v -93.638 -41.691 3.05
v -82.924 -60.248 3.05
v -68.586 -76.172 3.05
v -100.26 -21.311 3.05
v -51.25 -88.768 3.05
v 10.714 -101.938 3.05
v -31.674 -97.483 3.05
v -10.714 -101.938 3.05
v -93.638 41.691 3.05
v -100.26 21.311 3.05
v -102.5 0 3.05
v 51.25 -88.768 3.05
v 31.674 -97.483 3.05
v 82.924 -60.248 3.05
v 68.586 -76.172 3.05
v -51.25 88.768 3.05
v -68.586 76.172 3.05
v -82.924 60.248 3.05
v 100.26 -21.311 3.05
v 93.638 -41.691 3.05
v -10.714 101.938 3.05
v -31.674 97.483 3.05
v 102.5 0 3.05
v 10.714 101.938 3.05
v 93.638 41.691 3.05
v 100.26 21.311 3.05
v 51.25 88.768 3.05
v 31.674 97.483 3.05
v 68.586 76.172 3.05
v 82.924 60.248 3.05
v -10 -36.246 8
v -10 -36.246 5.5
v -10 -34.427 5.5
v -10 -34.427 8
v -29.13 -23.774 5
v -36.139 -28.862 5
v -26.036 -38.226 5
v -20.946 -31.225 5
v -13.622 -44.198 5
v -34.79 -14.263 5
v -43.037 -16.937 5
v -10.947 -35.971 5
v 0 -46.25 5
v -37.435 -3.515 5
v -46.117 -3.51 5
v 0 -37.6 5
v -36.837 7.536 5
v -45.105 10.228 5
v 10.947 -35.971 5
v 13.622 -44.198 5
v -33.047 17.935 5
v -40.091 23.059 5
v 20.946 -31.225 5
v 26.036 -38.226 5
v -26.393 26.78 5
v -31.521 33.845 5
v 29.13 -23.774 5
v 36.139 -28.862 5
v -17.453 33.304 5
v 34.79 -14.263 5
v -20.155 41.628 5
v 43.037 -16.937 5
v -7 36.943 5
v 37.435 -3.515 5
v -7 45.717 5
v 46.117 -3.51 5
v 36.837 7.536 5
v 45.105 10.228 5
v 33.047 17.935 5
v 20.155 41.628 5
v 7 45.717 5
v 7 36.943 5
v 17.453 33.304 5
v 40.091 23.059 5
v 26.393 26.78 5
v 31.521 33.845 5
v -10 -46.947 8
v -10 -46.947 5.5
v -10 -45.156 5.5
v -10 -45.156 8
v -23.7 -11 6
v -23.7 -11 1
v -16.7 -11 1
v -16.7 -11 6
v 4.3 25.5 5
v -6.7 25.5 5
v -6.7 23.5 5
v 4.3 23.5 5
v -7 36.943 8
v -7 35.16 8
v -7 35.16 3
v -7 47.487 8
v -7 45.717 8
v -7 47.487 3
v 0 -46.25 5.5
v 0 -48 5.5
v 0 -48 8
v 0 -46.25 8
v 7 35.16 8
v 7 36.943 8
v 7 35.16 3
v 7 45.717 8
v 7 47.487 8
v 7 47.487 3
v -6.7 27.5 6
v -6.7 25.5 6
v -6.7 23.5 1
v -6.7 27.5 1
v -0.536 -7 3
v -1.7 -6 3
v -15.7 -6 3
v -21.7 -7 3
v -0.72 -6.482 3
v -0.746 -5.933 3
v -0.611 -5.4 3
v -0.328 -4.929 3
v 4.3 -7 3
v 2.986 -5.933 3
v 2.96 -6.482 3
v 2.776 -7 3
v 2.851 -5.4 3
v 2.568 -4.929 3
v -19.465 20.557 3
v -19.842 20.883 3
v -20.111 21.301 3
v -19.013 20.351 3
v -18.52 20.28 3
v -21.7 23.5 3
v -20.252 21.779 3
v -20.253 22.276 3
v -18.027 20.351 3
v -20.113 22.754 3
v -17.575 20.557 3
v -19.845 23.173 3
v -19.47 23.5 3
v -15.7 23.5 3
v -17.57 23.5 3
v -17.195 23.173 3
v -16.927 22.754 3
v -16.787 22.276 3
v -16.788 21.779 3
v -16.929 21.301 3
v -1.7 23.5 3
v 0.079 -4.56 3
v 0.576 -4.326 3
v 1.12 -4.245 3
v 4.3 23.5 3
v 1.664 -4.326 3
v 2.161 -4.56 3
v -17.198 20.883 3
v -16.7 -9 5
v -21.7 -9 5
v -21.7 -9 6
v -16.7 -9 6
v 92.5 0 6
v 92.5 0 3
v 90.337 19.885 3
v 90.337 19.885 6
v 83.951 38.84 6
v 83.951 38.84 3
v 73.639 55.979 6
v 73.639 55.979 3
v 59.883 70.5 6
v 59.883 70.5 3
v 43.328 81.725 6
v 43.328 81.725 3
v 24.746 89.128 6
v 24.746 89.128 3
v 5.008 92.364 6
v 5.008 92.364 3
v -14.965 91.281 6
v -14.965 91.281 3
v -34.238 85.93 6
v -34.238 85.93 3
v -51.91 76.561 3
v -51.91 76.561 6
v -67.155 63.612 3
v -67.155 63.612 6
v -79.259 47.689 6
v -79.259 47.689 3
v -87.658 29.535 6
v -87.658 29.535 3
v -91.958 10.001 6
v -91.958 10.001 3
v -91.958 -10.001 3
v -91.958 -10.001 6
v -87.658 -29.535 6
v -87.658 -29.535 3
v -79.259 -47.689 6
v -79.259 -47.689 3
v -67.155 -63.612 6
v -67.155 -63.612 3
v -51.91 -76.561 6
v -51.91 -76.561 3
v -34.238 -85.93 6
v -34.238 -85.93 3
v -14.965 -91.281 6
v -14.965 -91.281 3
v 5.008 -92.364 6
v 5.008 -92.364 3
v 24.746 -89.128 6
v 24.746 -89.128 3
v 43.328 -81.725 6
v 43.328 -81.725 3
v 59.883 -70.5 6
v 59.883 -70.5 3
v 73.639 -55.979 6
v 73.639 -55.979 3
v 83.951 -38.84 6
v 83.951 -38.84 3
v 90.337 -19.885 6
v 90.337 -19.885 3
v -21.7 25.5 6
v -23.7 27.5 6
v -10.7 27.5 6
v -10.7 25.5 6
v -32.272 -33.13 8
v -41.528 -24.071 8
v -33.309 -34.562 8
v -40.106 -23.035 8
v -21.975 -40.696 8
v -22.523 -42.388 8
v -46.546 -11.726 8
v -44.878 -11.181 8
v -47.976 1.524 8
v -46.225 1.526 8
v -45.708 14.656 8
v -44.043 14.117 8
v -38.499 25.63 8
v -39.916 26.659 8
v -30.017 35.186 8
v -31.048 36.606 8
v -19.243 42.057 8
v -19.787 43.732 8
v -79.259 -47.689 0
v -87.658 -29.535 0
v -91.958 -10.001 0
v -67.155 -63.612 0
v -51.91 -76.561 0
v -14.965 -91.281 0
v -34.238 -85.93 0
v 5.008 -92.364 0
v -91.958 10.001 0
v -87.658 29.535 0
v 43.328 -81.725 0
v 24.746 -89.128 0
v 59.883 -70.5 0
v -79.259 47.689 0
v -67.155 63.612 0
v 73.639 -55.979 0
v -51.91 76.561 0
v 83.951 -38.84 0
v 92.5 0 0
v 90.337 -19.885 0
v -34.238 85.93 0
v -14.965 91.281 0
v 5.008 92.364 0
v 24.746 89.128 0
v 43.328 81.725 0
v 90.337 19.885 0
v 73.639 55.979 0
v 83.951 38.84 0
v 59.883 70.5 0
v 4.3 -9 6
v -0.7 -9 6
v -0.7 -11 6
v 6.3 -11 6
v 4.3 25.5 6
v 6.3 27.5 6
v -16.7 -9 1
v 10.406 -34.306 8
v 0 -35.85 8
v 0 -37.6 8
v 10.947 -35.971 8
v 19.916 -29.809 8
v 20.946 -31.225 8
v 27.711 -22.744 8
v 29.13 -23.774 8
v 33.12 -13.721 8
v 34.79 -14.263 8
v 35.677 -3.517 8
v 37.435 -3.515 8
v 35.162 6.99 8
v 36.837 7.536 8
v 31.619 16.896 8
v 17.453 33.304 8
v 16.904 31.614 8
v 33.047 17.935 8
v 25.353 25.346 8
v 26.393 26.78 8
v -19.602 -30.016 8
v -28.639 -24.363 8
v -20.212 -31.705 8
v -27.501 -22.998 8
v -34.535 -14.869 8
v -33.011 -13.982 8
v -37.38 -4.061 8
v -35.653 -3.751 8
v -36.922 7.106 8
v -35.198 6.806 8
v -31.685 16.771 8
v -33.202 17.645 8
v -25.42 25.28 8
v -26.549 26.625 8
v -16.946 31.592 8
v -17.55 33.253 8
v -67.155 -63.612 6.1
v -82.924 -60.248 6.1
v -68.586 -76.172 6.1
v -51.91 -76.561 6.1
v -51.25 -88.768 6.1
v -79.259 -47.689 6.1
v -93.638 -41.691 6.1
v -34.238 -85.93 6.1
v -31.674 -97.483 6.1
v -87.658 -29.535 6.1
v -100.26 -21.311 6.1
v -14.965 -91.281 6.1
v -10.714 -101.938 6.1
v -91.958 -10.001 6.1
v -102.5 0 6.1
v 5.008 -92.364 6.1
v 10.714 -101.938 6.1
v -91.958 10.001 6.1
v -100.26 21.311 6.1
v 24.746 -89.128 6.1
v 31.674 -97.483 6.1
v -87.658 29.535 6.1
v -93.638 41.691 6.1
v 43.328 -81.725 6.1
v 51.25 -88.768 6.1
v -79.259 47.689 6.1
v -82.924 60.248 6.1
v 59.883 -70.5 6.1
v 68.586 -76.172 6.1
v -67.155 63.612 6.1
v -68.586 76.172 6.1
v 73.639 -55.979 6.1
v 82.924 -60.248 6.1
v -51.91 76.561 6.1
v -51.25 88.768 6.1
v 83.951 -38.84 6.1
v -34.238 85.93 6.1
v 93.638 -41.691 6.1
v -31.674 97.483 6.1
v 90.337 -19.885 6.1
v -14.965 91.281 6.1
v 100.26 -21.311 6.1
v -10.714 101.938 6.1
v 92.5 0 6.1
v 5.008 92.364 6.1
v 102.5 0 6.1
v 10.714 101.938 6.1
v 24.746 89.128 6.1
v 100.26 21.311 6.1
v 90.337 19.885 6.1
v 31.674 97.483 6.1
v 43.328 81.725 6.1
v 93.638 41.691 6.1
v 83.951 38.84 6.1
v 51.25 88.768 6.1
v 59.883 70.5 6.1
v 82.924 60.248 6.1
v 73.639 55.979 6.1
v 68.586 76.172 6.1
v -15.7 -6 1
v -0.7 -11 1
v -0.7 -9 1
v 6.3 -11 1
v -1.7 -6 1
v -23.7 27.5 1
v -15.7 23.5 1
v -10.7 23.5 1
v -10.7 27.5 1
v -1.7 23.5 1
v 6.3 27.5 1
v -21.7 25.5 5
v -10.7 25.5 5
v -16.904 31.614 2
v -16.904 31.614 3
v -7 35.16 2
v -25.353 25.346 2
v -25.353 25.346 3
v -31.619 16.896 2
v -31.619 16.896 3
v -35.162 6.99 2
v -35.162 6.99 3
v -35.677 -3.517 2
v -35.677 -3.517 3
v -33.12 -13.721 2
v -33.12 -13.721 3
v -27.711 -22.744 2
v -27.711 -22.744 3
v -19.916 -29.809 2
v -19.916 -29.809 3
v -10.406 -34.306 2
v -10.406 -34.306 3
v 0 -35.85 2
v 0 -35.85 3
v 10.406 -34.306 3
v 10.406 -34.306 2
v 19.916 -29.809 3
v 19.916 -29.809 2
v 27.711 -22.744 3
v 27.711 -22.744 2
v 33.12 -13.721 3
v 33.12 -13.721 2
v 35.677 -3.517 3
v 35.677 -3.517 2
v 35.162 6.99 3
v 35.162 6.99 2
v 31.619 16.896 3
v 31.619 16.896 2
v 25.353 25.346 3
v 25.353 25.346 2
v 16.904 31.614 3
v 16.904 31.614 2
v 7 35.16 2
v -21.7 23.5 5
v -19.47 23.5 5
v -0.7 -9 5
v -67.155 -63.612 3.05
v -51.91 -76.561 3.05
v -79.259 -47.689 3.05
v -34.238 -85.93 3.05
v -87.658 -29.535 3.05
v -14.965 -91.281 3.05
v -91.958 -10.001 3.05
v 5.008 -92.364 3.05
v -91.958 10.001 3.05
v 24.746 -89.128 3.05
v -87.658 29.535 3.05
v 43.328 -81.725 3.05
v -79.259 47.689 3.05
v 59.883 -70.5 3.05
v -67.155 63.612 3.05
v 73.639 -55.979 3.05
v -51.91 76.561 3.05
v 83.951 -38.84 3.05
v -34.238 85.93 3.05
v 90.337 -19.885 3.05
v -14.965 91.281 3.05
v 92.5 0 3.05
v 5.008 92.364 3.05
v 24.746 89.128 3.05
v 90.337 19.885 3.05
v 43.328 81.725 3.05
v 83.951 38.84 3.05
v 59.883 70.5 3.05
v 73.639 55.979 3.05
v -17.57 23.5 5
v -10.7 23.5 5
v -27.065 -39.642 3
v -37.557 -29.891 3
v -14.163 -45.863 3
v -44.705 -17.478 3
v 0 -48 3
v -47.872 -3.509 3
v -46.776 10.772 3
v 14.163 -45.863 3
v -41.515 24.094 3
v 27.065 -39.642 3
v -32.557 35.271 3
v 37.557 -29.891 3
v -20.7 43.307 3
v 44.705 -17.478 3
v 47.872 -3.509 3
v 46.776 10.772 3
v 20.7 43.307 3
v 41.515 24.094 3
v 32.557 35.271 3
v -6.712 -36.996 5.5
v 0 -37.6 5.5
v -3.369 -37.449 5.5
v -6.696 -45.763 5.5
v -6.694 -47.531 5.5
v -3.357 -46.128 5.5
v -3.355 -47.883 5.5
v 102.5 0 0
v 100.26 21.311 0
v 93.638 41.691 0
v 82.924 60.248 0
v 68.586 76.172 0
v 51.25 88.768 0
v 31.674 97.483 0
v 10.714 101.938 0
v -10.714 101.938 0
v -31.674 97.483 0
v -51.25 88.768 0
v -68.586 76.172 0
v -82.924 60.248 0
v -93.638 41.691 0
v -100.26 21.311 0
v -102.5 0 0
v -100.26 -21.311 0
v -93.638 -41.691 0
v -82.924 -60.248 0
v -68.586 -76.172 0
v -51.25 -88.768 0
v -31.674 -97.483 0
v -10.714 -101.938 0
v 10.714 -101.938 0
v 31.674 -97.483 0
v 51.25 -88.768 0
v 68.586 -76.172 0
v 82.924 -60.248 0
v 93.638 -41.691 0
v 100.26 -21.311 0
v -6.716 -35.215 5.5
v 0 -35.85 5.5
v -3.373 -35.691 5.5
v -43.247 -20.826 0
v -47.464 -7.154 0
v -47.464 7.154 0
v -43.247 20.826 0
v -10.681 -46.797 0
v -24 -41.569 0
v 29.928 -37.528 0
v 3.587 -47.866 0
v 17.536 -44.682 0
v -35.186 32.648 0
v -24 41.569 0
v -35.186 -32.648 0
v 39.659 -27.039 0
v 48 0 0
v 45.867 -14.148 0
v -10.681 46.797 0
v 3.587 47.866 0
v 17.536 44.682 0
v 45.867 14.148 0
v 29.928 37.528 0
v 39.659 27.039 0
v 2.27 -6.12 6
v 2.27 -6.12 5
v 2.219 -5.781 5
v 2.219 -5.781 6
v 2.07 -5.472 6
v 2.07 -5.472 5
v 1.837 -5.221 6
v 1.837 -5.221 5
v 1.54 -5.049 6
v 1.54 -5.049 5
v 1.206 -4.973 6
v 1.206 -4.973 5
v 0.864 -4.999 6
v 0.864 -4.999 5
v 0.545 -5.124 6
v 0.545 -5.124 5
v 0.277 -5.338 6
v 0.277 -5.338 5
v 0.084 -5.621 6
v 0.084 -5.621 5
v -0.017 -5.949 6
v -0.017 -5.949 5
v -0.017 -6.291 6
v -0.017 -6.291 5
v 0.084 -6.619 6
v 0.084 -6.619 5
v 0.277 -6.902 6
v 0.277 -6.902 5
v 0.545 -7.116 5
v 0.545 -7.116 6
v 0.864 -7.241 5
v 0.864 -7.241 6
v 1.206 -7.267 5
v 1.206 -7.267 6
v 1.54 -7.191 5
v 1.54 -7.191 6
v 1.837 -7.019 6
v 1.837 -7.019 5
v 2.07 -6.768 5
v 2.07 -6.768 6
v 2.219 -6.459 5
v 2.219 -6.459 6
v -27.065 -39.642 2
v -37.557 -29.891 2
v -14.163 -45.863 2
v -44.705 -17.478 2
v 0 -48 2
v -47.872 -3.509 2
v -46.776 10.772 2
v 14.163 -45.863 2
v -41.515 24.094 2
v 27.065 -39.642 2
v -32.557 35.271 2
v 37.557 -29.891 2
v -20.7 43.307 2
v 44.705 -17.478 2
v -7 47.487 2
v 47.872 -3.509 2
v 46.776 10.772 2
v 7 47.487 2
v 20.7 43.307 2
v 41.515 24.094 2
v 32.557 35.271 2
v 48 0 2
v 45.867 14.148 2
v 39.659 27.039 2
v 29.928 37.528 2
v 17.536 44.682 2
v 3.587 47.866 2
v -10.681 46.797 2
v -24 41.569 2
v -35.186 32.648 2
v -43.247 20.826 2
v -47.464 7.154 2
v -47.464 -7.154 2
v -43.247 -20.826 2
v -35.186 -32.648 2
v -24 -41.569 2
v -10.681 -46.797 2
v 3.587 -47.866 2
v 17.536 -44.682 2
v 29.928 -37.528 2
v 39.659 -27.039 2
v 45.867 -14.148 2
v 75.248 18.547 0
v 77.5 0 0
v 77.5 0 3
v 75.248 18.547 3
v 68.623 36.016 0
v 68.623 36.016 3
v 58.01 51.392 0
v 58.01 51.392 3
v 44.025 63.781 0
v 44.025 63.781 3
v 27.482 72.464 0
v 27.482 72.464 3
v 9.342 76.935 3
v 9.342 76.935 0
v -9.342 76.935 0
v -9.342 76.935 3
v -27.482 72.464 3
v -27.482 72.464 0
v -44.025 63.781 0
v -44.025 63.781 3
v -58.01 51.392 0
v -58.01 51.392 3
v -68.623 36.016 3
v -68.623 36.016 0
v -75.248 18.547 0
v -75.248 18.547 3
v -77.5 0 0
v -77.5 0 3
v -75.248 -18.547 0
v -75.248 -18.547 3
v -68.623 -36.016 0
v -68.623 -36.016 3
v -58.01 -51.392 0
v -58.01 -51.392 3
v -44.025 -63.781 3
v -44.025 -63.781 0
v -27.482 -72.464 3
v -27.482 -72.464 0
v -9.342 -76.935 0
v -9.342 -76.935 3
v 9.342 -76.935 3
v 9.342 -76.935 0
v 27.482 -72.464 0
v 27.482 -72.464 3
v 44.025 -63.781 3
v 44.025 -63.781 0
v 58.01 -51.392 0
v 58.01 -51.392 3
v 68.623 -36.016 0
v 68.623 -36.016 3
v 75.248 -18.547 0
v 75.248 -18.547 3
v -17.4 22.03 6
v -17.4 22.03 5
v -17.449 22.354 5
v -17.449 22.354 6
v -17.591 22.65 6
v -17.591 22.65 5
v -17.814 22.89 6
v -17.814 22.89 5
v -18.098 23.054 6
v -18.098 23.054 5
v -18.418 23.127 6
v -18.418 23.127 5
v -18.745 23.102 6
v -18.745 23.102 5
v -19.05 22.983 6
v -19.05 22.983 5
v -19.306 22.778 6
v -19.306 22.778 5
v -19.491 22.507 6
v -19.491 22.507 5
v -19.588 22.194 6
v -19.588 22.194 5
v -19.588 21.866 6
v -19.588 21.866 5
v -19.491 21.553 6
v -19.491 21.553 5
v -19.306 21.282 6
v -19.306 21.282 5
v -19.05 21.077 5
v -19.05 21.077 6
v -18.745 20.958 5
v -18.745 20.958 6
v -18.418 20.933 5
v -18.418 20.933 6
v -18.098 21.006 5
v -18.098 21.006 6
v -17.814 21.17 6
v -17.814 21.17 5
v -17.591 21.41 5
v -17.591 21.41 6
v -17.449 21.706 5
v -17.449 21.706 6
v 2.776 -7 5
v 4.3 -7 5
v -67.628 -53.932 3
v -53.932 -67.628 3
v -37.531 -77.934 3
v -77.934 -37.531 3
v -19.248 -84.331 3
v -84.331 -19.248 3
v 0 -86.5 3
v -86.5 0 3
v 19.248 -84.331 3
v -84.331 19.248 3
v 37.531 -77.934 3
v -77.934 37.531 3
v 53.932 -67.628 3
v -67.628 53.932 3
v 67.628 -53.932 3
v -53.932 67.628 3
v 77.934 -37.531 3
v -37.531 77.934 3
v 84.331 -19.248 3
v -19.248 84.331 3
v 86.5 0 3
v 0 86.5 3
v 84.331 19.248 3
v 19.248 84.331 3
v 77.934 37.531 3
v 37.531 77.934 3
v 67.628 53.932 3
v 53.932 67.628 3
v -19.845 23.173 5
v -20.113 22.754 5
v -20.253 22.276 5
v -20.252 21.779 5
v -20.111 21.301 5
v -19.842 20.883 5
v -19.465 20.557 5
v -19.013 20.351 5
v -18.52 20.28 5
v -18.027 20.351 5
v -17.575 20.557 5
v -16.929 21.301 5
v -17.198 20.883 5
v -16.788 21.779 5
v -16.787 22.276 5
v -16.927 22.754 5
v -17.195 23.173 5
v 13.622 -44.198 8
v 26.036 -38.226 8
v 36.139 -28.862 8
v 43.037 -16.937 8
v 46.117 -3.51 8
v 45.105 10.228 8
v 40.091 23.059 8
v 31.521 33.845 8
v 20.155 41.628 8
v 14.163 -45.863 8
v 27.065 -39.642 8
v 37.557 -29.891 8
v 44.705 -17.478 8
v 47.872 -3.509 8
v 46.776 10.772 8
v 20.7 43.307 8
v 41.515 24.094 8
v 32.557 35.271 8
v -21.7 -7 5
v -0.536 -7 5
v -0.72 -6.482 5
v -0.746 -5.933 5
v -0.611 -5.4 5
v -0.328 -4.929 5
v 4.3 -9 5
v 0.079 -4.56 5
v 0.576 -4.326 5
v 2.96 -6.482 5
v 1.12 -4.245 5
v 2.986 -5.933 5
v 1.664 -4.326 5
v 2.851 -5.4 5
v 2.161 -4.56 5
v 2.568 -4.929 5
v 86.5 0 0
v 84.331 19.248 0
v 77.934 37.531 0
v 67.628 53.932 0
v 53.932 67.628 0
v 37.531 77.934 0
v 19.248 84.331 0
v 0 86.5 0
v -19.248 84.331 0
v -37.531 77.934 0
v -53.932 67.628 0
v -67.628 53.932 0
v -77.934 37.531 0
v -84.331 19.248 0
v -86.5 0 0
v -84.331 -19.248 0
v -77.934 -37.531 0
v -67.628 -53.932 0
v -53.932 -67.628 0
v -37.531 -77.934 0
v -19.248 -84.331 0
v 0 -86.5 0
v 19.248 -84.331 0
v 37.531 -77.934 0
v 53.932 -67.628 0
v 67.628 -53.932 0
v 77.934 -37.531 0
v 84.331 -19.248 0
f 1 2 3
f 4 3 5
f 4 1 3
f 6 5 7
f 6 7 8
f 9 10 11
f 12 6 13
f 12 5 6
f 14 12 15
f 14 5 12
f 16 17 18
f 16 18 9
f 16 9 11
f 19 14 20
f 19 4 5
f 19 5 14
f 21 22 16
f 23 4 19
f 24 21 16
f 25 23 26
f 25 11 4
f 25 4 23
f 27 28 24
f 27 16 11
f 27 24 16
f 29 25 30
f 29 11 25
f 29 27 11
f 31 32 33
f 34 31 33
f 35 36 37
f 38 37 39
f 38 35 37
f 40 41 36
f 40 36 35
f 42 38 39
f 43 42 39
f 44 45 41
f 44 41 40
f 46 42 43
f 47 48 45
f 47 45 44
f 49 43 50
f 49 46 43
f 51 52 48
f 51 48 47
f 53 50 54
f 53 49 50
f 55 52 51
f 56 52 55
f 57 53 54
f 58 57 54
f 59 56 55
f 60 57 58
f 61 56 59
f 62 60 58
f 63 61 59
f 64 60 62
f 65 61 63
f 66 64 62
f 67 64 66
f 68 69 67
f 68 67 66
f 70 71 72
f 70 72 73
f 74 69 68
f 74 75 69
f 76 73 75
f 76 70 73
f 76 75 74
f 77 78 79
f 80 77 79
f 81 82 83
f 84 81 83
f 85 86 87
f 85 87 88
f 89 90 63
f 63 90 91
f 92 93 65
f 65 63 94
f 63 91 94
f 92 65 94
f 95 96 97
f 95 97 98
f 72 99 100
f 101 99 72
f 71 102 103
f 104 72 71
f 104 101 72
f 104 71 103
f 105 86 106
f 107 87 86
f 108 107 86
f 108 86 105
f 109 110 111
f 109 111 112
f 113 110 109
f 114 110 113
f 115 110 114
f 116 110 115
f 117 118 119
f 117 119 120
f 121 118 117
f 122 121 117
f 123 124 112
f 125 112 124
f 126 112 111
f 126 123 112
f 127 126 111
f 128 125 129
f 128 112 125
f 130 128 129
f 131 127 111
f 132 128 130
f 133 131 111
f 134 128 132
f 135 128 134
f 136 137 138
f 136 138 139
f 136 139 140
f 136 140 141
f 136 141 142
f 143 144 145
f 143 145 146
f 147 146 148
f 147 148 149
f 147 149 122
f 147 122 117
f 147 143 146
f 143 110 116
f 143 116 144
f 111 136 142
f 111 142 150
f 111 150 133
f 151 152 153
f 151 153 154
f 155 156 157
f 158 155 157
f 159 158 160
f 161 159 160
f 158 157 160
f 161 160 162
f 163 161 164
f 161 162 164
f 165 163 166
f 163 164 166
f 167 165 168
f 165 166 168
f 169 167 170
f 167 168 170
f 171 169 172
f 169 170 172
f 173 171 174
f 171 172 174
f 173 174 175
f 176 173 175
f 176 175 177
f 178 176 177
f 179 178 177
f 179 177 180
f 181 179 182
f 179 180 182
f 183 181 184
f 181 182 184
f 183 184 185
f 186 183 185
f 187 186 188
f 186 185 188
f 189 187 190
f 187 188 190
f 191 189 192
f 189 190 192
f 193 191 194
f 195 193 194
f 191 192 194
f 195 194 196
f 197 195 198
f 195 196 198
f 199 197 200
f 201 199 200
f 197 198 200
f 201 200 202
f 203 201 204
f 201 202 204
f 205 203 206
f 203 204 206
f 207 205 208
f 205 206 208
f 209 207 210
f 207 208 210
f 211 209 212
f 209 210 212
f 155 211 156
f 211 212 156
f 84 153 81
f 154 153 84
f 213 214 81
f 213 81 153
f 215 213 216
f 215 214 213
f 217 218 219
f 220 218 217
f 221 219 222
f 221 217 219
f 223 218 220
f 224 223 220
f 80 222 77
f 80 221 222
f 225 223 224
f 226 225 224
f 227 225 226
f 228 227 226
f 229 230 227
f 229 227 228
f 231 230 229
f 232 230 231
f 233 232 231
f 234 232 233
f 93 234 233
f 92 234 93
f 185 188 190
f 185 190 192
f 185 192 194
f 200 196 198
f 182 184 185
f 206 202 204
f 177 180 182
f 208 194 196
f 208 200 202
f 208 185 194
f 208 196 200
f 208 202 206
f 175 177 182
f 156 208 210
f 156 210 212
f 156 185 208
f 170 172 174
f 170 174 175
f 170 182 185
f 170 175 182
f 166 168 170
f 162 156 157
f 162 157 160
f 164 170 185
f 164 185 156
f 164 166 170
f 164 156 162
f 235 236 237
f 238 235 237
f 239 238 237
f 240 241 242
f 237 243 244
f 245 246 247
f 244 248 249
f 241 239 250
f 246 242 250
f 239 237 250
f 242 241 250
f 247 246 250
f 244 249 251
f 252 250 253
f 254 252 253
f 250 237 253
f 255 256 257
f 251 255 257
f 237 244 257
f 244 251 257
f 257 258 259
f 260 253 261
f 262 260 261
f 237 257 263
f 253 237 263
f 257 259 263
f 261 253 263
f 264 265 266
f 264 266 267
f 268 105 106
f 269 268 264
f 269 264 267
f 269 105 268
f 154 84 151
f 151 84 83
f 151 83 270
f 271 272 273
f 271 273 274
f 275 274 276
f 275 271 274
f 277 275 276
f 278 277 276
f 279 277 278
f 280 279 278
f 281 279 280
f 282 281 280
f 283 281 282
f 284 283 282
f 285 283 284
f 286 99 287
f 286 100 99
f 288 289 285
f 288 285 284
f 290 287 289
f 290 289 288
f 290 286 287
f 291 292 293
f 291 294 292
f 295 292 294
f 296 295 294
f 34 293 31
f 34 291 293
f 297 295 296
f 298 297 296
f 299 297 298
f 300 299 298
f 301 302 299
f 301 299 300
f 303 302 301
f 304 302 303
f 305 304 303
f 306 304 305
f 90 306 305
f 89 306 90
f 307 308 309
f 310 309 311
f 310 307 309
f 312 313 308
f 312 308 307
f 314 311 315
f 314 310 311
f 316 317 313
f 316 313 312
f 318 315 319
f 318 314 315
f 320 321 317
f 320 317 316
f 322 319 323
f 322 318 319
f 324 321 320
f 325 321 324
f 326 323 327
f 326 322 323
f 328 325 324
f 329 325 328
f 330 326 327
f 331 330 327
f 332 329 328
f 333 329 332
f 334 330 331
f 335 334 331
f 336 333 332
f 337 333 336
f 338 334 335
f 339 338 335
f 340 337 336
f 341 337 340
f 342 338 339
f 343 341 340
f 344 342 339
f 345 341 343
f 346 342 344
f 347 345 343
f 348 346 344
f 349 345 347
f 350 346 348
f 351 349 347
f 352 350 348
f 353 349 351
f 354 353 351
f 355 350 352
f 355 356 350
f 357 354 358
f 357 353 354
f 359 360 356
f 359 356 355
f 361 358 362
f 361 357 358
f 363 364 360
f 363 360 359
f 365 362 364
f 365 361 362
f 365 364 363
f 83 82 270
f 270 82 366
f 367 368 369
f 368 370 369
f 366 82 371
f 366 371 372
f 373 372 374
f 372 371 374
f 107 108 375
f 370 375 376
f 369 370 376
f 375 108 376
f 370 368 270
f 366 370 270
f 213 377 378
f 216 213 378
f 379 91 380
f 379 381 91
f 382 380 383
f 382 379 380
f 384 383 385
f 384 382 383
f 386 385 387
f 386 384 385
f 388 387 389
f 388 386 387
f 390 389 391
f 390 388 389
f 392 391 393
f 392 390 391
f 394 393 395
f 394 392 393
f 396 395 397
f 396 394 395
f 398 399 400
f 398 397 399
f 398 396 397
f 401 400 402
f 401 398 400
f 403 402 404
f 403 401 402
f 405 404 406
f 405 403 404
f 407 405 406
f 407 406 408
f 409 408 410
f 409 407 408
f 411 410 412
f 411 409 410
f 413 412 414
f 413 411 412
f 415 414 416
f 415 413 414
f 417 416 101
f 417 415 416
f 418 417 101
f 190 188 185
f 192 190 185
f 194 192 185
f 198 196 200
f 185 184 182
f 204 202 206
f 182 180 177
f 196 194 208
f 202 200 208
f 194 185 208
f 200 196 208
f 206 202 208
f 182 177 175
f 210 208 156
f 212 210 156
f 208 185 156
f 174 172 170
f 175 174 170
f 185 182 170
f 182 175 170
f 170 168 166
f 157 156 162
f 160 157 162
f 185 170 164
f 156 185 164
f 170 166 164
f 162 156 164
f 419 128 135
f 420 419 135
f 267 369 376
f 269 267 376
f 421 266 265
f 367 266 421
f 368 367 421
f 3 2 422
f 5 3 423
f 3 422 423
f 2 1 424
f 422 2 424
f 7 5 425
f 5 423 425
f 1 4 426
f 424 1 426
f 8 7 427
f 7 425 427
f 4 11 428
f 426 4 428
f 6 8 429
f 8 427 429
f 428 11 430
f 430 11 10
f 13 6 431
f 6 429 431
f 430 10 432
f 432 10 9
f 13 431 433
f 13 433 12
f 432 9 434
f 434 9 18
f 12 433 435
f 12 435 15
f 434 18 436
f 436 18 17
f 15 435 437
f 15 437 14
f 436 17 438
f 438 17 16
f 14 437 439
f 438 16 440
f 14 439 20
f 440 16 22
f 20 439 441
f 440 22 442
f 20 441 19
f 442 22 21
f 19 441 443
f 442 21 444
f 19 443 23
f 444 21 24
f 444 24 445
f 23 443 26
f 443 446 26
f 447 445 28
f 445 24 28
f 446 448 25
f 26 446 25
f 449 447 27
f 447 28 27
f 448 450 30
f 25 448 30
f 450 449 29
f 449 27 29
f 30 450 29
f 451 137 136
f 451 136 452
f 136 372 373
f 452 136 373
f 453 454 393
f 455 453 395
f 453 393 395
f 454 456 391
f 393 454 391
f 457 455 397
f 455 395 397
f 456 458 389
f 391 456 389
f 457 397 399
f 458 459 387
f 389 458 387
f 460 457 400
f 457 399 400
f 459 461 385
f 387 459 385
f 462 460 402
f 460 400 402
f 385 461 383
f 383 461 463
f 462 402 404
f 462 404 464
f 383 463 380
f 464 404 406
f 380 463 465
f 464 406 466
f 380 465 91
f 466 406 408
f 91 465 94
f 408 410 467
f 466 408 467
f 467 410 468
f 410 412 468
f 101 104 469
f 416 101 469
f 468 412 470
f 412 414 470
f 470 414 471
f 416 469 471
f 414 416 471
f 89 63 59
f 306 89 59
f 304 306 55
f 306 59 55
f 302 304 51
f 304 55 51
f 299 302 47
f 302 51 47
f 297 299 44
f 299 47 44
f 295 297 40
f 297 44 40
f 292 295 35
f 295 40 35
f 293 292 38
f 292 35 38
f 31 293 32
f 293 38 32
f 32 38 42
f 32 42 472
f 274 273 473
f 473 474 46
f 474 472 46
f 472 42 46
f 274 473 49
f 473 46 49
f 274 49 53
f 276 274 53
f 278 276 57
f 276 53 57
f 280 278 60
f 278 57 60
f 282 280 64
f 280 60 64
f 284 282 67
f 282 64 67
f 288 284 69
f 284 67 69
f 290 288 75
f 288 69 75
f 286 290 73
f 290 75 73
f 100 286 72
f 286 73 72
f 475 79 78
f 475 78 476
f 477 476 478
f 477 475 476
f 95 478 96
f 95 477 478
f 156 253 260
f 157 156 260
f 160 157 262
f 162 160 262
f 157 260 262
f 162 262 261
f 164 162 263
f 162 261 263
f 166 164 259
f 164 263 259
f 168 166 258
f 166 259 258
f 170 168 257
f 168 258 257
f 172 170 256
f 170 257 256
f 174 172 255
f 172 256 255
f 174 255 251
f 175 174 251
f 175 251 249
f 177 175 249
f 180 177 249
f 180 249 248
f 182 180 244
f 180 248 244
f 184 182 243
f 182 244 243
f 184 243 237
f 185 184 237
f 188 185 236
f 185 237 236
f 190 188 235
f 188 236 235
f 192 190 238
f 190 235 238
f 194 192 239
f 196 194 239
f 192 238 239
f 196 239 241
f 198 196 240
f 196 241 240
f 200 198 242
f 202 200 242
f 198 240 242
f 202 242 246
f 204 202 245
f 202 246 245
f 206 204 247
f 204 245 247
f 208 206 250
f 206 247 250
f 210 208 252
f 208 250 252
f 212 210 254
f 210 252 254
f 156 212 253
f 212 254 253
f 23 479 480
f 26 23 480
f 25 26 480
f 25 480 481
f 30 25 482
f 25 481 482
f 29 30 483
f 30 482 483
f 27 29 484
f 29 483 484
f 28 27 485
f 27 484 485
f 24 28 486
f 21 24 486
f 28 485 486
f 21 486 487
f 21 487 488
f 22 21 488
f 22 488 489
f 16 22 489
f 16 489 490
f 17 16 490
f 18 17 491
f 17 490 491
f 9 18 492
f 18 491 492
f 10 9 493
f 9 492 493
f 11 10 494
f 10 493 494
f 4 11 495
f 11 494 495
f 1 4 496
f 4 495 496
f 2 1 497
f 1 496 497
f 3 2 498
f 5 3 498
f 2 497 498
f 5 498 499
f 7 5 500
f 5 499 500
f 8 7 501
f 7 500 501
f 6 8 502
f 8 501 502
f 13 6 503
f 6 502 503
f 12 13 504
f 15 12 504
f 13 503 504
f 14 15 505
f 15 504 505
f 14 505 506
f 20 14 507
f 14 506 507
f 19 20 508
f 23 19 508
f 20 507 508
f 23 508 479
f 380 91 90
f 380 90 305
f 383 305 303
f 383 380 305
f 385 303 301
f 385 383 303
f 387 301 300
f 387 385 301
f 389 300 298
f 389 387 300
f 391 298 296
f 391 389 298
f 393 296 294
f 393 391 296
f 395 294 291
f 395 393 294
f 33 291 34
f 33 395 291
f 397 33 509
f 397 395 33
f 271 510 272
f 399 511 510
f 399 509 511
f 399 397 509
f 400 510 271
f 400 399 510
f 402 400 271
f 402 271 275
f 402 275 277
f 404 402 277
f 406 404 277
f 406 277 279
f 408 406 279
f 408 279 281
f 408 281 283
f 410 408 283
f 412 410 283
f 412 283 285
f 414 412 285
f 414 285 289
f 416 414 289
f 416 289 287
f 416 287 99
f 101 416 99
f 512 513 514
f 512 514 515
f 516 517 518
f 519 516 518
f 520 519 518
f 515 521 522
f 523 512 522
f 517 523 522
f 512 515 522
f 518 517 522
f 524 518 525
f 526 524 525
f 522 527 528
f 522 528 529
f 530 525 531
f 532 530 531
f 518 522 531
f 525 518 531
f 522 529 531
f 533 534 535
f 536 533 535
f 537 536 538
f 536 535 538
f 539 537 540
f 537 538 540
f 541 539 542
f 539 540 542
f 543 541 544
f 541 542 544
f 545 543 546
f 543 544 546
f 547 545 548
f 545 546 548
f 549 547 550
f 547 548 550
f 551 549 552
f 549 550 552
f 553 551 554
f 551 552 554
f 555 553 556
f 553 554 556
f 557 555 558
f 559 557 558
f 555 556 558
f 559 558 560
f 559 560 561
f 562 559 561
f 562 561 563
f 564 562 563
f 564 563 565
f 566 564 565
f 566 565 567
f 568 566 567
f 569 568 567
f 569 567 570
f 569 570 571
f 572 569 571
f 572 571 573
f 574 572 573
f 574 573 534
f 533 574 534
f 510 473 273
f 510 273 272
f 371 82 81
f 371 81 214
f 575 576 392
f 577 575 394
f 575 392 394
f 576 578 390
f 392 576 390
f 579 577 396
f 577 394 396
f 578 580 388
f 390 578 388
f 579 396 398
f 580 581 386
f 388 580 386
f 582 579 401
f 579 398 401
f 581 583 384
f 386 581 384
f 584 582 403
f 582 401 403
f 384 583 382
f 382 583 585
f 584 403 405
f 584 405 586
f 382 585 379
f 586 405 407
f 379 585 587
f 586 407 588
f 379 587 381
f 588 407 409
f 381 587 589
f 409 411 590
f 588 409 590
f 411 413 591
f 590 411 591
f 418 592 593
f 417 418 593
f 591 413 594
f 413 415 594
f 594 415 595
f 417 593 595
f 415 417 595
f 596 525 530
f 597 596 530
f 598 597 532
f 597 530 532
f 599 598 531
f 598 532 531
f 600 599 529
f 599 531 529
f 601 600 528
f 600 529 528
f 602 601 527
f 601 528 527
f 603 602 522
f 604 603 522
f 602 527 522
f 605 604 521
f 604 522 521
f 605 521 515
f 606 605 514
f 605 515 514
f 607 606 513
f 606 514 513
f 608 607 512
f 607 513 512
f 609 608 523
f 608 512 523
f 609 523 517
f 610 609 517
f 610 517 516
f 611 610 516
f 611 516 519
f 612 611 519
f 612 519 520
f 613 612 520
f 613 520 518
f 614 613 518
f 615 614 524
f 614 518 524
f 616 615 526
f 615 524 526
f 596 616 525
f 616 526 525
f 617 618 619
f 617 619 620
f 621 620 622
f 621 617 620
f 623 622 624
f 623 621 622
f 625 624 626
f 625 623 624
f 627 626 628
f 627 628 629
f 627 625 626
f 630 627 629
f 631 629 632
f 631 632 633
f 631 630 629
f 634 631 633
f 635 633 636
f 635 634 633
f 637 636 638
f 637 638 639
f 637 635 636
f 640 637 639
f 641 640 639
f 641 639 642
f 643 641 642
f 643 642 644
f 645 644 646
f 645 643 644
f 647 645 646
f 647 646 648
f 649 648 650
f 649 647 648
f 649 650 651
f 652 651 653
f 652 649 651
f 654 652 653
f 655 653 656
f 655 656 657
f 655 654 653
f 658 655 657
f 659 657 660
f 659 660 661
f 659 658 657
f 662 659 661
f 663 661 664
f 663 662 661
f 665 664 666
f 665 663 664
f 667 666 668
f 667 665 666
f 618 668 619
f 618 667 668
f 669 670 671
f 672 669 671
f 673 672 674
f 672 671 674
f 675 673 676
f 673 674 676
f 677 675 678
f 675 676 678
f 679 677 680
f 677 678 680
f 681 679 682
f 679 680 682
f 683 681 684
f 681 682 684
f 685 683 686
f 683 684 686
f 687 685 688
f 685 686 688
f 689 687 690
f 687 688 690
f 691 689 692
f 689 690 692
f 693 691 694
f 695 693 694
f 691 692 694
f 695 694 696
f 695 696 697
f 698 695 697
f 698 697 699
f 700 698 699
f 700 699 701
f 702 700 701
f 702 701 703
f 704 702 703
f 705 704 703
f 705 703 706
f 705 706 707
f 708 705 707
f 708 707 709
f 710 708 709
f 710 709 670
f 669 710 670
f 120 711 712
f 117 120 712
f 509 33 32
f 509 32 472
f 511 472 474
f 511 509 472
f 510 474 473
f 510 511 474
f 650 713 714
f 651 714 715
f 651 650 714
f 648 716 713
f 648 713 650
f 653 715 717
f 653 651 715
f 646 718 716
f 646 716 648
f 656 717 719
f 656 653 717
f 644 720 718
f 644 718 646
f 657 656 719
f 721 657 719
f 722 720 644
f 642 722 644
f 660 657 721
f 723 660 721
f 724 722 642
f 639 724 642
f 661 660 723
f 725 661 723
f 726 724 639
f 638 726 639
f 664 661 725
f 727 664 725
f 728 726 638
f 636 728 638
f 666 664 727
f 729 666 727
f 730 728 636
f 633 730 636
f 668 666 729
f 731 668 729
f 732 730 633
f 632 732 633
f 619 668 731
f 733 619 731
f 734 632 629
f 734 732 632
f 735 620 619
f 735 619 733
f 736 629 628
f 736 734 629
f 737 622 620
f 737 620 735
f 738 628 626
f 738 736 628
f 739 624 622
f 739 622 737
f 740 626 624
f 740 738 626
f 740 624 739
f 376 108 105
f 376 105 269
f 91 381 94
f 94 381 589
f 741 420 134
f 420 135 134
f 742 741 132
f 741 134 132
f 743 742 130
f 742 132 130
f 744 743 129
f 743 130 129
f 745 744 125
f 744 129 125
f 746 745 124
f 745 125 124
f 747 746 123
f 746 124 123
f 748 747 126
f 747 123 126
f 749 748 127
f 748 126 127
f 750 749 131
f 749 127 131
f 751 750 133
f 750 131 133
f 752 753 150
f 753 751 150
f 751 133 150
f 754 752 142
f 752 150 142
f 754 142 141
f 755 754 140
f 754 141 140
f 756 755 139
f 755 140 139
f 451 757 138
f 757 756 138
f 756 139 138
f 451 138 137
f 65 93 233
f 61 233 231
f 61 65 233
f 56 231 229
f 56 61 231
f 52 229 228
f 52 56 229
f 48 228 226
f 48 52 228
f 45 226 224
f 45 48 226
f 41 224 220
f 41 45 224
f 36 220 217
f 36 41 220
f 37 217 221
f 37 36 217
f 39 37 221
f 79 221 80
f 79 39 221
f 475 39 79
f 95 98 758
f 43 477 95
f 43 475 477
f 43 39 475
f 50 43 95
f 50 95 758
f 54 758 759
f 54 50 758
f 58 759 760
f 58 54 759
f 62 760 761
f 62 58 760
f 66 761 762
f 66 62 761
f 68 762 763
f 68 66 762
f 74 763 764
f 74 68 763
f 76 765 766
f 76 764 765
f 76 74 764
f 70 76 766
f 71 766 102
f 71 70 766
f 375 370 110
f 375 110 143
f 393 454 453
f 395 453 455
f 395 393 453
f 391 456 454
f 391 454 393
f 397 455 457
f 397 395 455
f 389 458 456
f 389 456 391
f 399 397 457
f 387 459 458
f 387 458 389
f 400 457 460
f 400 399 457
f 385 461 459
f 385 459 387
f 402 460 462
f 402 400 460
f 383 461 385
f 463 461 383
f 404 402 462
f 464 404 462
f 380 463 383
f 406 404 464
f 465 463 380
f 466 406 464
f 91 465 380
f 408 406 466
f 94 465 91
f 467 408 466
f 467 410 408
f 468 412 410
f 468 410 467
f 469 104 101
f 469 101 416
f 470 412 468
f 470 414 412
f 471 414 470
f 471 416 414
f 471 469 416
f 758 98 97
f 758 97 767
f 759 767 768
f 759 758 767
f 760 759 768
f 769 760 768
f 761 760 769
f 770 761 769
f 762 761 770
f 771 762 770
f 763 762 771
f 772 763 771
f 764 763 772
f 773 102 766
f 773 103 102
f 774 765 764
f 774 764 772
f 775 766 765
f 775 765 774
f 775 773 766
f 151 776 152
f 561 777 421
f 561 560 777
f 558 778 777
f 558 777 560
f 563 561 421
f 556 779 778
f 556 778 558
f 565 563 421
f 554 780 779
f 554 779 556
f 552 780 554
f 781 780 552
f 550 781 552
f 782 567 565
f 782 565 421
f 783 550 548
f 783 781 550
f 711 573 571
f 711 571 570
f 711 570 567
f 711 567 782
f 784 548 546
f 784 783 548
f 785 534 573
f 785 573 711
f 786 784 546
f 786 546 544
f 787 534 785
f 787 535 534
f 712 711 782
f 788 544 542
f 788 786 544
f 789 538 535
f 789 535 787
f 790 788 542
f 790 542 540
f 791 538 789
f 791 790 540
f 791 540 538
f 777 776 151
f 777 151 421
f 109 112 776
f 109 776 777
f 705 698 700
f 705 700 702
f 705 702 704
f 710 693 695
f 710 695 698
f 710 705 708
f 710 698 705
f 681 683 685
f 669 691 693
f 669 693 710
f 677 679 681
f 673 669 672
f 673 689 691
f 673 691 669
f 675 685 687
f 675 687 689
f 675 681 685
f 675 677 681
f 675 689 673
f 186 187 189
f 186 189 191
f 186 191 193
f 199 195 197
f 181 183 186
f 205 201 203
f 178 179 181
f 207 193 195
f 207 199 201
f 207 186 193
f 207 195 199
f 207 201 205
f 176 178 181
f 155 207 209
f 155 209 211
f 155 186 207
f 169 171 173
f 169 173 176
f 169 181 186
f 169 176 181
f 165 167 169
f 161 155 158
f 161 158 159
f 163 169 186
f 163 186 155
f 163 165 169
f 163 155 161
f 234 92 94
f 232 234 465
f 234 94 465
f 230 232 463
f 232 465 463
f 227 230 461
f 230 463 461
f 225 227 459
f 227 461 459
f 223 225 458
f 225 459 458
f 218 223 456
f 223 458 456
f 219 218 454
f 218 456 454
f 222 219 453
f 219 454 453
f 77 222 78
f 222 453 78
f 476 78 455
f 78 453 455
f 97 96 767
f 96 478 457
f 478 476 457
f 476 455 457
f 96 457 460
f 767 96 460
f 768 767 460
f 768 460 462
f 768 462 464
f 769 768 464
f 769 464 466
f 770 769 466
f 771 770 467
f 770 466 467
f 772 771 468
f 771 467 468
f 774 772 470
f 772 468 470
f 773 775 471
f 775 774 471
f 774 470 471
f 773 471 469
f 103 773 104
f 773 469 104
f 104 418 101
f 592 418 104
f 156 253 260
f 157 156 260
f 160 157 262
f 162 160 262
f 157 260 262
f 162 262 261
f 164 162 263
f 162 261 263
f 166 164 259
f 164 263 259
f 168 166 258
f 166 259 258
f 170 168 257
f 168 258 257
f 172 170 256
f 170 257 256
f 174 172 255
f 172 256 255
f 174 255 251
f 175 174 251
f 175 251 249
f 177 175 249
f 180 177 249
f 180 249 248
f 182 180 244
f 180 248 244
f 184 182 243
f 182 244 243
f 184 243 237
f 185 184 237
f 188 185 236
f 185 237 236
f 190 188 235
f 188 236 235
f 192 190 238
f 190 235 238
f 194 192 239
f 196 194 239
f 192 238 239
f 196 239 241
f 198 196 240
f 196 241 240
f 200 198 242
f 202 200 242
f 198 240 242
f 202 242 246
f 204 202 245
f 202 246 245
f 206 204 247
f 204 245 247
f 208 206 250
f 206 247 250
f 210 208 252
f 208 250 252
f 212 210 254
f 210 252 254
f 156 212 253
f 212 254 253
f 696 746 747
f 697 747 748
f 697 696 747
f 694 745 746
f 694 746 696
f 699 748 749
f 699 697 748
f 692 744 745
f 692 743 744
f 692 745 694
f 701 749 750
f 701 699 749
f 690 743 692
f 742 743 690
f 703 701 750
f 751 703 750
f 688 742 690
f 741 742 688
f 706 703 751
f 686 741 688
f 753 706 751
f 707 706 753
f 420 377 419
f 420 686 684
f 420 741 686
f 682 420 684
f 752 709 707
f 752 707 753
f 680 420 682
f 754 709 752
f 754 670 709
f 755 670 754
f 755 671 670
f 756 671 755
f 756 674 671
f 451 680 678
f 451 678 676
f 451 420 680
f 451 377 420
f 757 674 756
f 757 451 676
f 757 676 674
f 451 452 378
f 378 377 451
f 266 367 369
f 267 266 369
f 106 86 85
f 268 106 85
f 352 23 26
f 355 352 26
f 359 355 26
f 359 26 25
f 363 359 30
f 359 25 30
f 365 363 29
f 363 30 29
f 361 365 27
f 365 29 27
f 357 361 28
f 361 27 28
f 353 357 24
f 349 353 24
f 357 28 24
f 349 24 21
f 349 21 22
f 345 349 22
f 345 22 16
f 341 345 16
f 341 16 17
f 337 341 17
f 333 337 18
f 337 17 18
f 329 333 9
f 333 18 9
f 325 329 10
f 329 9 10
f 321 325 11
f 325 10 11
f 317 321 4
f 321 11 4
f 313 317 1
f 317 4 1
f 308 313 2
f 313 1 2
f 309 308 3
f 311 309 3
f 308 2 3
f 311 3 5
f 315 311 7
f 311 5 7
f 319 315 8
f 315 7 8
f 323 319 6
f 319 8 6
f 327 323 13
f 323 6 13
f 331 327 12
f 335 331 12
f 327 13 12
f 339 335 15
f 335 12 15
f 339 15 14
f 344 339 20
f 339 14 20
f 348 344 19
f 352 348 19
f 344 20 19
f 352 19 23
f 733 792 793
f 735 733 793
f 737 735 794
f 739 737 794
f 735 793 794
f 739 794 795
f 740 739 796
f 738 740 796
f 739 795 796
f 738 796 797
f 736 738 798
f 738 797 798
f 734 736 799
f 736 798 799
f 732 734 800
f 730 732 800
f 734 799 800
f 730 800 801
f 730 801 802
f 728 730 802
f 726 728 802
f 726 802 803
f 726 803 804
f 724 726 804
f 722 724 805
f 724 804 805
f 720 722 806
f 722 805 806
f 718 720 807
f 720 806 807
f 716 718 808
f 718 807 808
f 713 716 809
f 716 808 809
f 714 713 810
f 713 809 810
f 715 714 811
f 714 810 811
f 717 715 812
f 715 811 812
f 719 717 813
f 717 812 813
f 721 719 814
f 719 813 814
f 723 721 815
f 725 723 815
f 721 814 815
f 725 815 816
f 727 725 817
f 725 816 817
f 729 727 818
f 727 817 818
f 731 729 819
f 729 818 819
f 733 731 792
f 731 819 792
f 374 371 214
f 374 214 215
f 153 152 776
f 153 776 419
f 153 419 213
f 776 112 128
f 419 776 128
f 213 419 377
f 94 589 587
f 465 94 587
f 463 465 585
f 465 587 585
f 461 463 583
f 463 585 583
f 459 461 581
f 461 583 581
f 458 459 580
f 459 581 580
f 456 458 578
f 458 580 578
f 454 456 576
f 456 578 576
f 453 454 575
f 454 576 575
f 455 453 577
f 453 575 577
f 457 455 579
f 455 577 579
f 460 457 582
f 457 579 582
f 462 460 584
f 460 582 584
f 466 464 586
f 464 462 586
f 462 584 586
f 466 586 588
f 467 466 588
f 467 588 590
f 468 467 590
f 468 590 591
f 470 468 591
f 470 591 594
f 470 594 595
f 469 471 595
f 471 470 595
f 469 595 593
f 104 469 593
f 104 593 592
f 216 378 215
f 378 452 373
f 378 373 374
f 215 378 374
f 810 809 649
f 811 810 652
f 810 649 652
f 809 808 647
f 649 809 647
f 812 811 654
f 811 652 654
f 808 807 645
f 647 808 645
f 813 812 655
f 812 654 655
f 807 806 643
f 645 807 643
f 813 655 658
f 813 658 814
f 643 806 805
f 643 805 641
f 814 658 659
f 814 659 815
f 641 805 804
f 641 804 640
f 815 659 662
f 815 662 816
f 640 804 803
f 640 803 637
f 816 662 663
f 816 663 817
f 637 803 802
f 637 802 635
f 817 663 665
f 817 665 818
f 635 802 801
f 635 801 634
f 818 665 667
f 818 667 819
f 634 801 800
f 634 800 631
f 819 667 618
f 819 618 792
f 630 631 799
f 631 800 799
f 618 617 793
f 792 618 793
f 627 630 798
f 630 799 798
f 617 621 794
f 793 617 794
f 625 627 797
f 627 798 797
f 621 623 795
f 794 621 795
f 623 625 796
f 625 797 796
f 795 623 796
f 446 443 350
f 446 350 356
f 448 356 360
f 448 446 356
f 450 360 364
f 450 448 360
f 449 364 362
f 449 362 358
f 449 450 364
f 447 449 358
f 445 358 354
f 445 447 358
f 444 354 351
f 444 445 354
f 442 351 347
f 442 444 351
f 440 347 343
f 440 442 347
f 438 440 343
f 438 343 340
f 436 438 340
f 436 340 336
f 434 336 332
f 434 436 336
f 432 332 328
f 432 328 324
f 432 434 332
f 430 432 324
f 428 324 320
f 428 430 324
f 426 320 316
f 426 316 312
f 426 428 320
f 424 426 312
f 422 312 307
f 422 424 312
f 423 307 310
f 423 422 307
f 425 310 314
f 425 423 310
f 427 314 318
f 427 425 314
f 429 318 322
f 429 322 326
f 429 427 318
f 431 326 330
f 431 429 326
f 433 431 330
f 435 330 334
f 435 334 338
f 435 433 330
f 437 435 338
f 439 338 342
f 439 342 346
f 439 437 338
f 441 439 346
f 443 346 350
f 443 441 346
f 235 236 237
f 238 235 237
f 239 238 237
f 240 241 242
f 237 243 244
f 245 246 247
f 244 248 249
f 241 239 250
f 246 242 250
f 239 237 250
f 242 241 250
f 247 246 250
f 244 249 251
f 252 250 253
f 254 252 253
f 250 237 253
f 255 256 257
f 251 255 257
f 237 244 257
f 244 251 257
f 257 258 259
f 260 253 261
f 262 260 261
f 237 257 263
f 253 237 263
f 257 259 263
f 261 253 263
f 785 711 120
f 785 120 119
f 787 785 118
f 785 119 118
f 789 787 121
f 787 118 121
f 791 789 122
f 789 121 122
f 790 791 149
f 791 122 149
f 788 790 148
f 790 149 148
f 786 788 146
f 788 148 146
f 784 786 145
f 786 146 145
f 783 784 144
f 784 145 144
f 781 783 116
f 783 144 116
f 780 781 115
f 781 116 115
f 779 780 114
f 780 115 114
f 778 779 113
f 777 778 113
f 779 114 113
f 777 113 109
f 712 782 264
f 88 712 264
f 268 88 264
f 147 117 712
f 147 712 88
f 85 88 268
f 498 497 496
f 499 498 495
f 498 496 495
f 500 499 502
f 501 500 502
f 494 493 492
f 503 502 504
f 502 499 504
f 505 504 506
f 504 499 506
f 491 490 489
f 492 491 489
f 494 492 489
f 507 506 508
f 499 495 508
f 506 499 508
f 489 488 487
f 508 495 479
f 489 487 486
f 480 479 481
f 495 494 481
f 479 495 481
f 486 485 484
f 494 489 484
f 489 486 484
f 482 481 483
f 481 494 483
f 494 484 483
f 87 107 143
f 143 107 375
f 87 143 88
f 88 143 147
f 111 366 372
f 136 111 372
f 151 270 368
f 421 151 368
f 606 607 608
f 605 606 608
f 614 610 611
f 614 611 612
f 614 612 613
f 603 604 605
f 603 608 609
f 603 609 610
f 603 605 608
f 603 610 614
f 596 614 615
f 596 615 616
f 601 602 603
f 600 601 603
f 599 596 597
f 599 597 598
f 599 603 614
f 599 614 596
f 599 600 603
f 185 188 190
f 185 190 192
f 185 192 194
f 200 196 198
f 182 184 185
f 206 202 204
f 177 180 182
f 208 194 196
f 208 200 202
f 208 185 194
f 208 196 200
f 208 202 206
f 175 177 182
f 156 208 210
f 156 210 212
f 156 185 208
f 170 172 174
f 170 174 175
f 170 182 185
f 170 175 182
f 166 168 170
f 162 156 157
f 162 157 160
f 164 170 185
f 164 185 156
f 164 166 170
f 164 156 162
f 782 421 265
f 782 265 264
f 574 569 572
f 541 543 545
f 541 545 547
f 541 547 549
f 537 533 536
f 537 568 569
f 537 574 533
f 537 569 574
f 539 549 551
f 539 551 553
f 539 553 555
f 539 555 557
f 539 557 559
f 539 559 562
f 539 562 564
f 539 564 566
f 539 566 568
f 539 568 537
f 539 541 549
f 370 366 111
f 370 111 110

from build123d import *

# Parameters (mm, degrees)
CYLINDER_R        = 92.5
CYLINDER_DEPTH    = 3
CYLINDER002_R     = 92.5
CYLINDER002_DEPTH = 3.05
CYLINDER001_R     = 102.5
CYLINDER001_DEPTH = 3.05
CYLINDER003_R     = 102.5
CYLINDER003_DEPTH = 3.05
CYLINDER004_R     = 92.5
CYLINDER004_DEPTH = 3
CYLINDER005_R     = 92.5
CYLINDER005_DEPTH = 3
CYLINDER006_R     = 77.5
CYLINDER006_DEPTH = 3
CYLINDER007_R     = 86.5
CYLINDER007_DEPTH = 3
CYLINDER014_R     = 1.1
CYLINDER014_DEPTH = 3
CYLINDER015_R     = 1.15
CYLINDER015_DEPTH = 3
CYLINDER016_R     = 1.75
CYLINDER016_DEPTH = 2
CYLINDER017_R     = 1.875
CYLINDER017_DEPTH = 2
BOX004_W          = 26
BOX004_H          = 2
BOX004_DEPTH      = 2
BOX006_W          = 2
BOX006_H          = 34.5
BOX006_DEPTH      = 5
BOX007_W          = 2
BOX007_H          = 34.5
BOX007_DEPTH      = 5
BOX009_W          = 7
BOX009_H          = 2
BOX009_DEPTH      = 5
BOX010_W          = 7
BOX010_H          = 2
BOX010_DEPTH      = 5
BOX011_W          = 4
BOX011_H          = 4
BOX011_DEPTH      = 5
BOX005_W          = 26
BOX005_H          = 2
BOX005_DEPTH      = 2
BOX003_W          = 14
BOX003_H          = 29.5
BOX003_DEPTH      = 2
BOX002_W          = 26
BOX002_H          = 34.5
BOX002_DEPTH      = 2
BOX008_W          = 30
BOX008_H          = 2
BOX008_DEPTH      = 5
CYLINDER018_R     = 48
CYLINDER018_DEPTH = 2
BOX001_W          = 14
BOX001_H          = 15
BOX001_DEPTH      = 5
CYLINDER019_R     = 35.85
CYLINDER019_DEPTH = 1
CYLINDER020_R     = 48
CYLINDER020_DEPTH = 1
BOX012_W          = 10
BOX012_H          = 16
BOX012_DEPTH      = 3
BOX_W             = 14
BOX_H             = 15
BOX_DEPTH         = 5
CYLINDER009_R     = 37.6
CYLINDER009_DEPTH = 3
CYLINDER008_R     = 46.25
CYLINDER008_DEPTH = 3
CYLINDER011_R     = 35.85
CYLINDER011_DEPTH = 3
CYLINDER010_R     = 48
CYLINDER010_DEPTH = 3
CYLINDER013_R     = 35.85
CYLINDER013_DEPTH = 2
CYLINDER012_R     = 48
CYLINDER012_DEPTH = 2


with BuildPart() as astronaut:
    # Cylinder → Cylinder (new body)
    with BuildSketch(Plane.XY):
        Circle(CYLINDER_R)
    extrude(amount=CYLINDER_DEPTH)


with BuildPart() as cylinder002:
    # Cylinder002 → Cylinder002 (new body)
    with BuildSketch(Plane.XY):
        Circle(CYLINDER002_R)
    extrude(amount=CYLINDER002_DEPTH)


with BuildPart() as standoff_base:
    # Cylinder001 → Cylinder001 (new body)
    with BuildSketch(Plane.XY):
        Circle(CYLINDER001_R)
    extrude(amount=CYLINDER001_DEPTH)

    # Cut: cut Cylinder002
    add(cylinder002.part, mode=Mode.SUBTRACT)


with BuildPart() as standoff_base_1:
    # Cut placement: moved
    add(standoff_base.part.moved(Location((0, 0, 3.05))))


with BuildPart() as backplate_base:
    # Cylinder003 → Cylinder003 (new body)
    with BuildSketch(Plane.XY):
        Circle(CYLINDER003_R)
    extrude(amount=CYLINDER003_DEPTH)


with BuildPart() as cylinder004:
    # Cylinder004 → Cylinder004 (new body)
    with BuildSketch(Plane.XY):
        Circle(CYLINDER004_R)
    extrude(amount=CYLINDER004_DEPTH)


with BuildPart() as cylinder005:
    # Cylinder005 → Cylinder005 (new body)
    with BuildSketch(Plane.XY.offset(3)):
        Circle(CYLINDER005_R)
    extrude(amount=CYLINDER005_DEPTH)


with BuildPart() as cylinder006:
    # Cylinder006 → Cylinder006 (new body)
    with BuildSketch(Plane.XY):
        Circle(CYLINDER006_R)
    extrude(amount=CYLINDER006_DEPTH)


with BuildPart() as large_led_ring:
    # Cylinder007 → Cylinder007 (new body)
    with BuildSketch(Plane.XY):
        Circle(CYLINDER007_R)
    extrude(amount=CYLINDER007_DEPTH)

    # Cut001: cut Cylinder006
    add(cylinder006.part, mode=Mode.SUBTRACT)


with BuildPart() as cylinder014:
    # Cylinder014 → Cylinder014 (new body)
    with BuildSketch(Plane(origin=(3.2, 31.03, 2), x_dir=(1, 0, 0), z_dir=(0, 0, 1))):
        Circle(CYLINDER014_R)
    extrude(amount=CYLINDER014_DEPTH)


with BuildPart() as cylinder015:
    # Cylinder015 → Cylinder015 (new body)
    with BuildSketch(Plane(origin=(22.82, 2.88, 2), x_dir=(1, 0, 0), z_dir=(0, 0, 1))):
        Circle(CYLINDER015_R)
    extrude(amount=CYLINDER015_DEPTH)


with BuildPart() as cylinder016:
    # Cylinder016 → Cylinder016 (new body)
    with BuildSketch(Plane(origin=(3.18, 31.03, 2), x_dir=(1, 0, 0), z_dir=(0, 0, 1))):
        Circle(CYLINDER016_R)
    extrude(amount=CYLINDER016_DEPTH)


with BuildPart() as cylinder017:
    # Cylinder017 → Cylinder017 (new body)
    with BuildSketch(Plane(origin=(22.82, 2.88, 2), x_dir=(1, 0, 0), z_dir=(0, 0, 1))):
        Circle(CYLINDER017_R)
    extrude(amount=CYLINDER017_DEPTH)


with BuildPart() as cube004:
    # Box004 → Box004 (new body)
    with BuildSketch(Plane.XY.offset(2)):
        with Locations((13, 1)):
            Rectangle(BOX004_W, BOX004_H)
    extrude(amount=BOX004_DEPTH)


with BuildPart() as cube006:
    # Box006 → Box006 (new body)
    with BuildSketch(Plane(origin=(-2, 0, 0), x_dir=(1, 0, 0), z_dir=(0, 0, 1))):
        with Locations((1, 17.25)):
            Rectangle(BOX006_W, BOX006_H)
    extrude(amount=BOX006_DEPTH)


with BuildPart() as cube007:
    # Box007 → Box007 (new body)
    with BuildSketch(Plane(origin=(26, 0, 0), x_dir=(1, 0, 0), z_dir=(0, 0, 1))):
        with Locations((1, 17.25)):
            Rectangle(BOX007_W, BOX007_H)
    extrude(amount=BOX007_DEPTH)


with BuildPart() as cube009:
    # Box009 → Box009 (new body)
    with BuildSketch(Plane(origin=(-2, -2, 0), x_dir=(1, 0, 0), z_dir=(0, 0, 1))):
        with Locations((3.5, 1)):
            Rectangle(BOX009_W, BOX009_H)
    extrude(amount=BOX009_DEPTH)


with BuildPart() as cube010:
    # Box010 → Box010 (new body)
    with BuildSketch(Plane(origin=(21, -2, 0), x_dir=(1, 0, 0), z_dir=(0, 0, 1))):
        with Locations((3.5, 1)):
            Rectangle(BOX010_W, BOX010_H)
    extrude(amount=BOX010_DEPTH)


with BuildPart() as removal_hole:
    # Box011 → Box011 (new body)
    with BuildSketch(Plane(origin=(11, 32.5, 0), x_dir=(1, 0, 0), z_dir=(0, 0, 1))):
        with Locations((2, 2)):
            Rectangle(BOX011_W, BOX011_H)
    extrude(amount=BOX011_DEPTH)


with BuildPart() as cut009:
    # Box005 → Box005 (new body)
    with BuildSketch(Plane(origin=(0, 32.5, 2), x_dir=(1, 0, 0), z_dir=(0, 0, 1))):
        with Locations((13, 1)):
            Rectangle(BOX005_W, BOX005_H)
    extrude(amount=BOX005_DEPTH)

    # Cut009: cut Removal hole
    add(removal_hole.part, mode=Mode.SUBTRACT)


with BuildPart() as cube003:
    # Box003 → Box003 (new body)
    with BuildSketch(Plane(origin=(6, 3, 0), x_dir=(1, 0, 0), z_dir=(0, 0, 1))):
        with Locations((7, 14.75)):
            Rectangle(BOX003_W, BOX003_H)
    extrude(amount=BOX003_DEPTH)


with BuildPart() as cut010:
    # Box002 → Box002 (new body)
    with BuildSketch(Plane.XY):
        with Locations((13, 17.25)):
            Rectangle(BOX002_W, BOX002_H)
    extrude(amount=BOX002_DEPTH)

    # Cut008: cut Cube003
    add(cube003.part, mode=Mode.SUBTRACT)

    # Cut010: cut Removal hole
    add(removal_hole.part, mode=Mode.SUBTRACT)


with BuildPart() as d1_stand_with_backing:
    # Box008 → Box008 (new body)
    with BuildSketch(Plane(origin=(-2, 34.5, 0), x_dir=(1, 0, 0), z_dir=(0, 0, 1))):
        with Locations((15, 1)):
            Rectangle(BOX008_W, BOX008_H)
    extrude(amount=BOX008_DEPTH)

    # Cut011: cut Removal hole
    add(removal_hole.part, mode=Mode.SUBTRACT)

    # Fusion001: union Cylinder014, Cylinder015, Cylinder016, Cylinder017, Cube004, Cube006, Cube007, Cube009, Cube010, Cut009, Cut010
    add(cylinder014.part)
    add(cylinder015.part)
    add(cylinder016.part)
    add(cylinder017.part)
    add(cube004.part)
    add(cube006.part)
    add(cube007.part)
    add(cube009.part)
    add(cube010.part)
    add(cut009.part)
    add(cut010.part)


with BuildPart() as d1_stand_with_backing_1:
    # Fusion001 placement: moved
    add(d1_stand_with_backing.part.moved(Location((-21.7, -9, 1))))


with BuildPart() as cylinder018:
    # Cylinder018 → Cylinder018 (new body)
    with BuildSketch(Plane.XY):
        Circle(CYLINDER018_R)
    extrude(amount=CYLINDER018_DEPTH)


with BuildPart() as cube001:
    # Box001 → Box001 (new body)
    with BuildSketch(Plane(origin=(-7, 34, -2), x_dir=(1, 0, 0), z_dir=(0, 0, 1))):
        with Locations((7, 7.5)):
            Rectangle(BOX001_W, BOX001_H)
    extrude(amount=BOX001_DEPTH)


with BuildPart() as cylinder019:
    # Cylinder019 → Cylinder019 (new body)
    with BuildSketch(Plane.XY.offset(2)):
        Circle(CYLINDER019_R)
    extrude(amount=CYLINDER019_DEPTH)


with BuildPart() as cut013:
    # Cylinder020 → Cylinder020 (new body)
    with BuildSketch(Plane.XY.offset(2)):
        Circle(CYLINDER020_R)
    extrude(amount=CYLINDER020_DEPTH)

    # Cut012: cut Cylinder019
    add(cylinder019.part, mode=Mode.SUBTRACT)

    # Cut013: cut Cube001
    add(cube001.part, mode=Mode.SUBTRACT)


with BuildPart() as cube011:
    # Box012 → Box012 (new body)
    with BuildSketch(Plane(origin=(-10, -49, 5.5), x_dir=(1, 0, 0), z_dir=(0, 0, 1))):
        with Locations((5, 8)):
            Rectangle(BOX012_W, BOX012_H)
    extrude(amount=BOX012_DEPTH)


with BuildPart() as cube:
    # Box → Box (new body)
    with BuildSketch(Plane(origin=(-7, 34, -2), x_dir=(1, 0, 0), z_dir=(0, 0, 1))):
        with Locations((7, 7.5)):
            Rectangle(BOX_W, BOX_H)
    extrude(amount=BOX_DEPTH)


with BuildPart() as cylinder009:
    # Cylinder009 → Cylinder009 (new body)
    with BuildSketch(Plane.XY):
        Circle(CYLINDER009_R)
    extrude(amount=CYLINDER009_DEPTH)


with BuildPart() as small_led_ring:
    # Cylinder008 → Cylinder008 (new body)
    with BuildSketch(Plane.XY):
        Circle(CYLINDER008_R)
    extrude(amount=CYLINDER008_DEPTH)

    # Cut002: cut Cylinder009
    add(cylinder009.part, mode=Mode.SUBTRACT)


with BuildPart() as cylinder011:
    # Cylinder011 → Cylinder011 (new body)
    with BuildSketch(Plane.XY):
        Circle(CYLINDER011_R)
    extrude(amount=CYLINDER011_DEPTH)


with BuildPart() as cut005:
    # Cylinder010 → Cylinder010 (new body)
    with BuildSketch(Plane.XY):
        Circle(CYLINDER010_R)
    extrude(amount=CYLINDER010_DEPTH)

    # Cut003: cut Cylinder011
    add(cylinder011.part, mode=Mode.SUBTRACT)

    # Cut004: cut Small LED Ring
    add(small_led_ring.part, mode=Mode.SUBTRACT)

    # Cut005: cut Cube
    add(cube.part, mode=Mode.SUBTRACT)


with BuildPart() as cylinder013:
    # Cylinder013 → Cylinder013 (new body)
    with BuildSketch(Plane.XY.offset(-2)):
        Circle(CYLINDER013_R)
    extrude(amount=CYLINDER013_DEPTH)


with BuildPart() as small_ring_track_with_usb_cut:
    # Cylinder012 → Cylinder012 (new body)
    with BuildSketch(Plane.XY.offset(-2)):
        Circle(CYLINDER012_R)
    extrude(amount=CYLINDER012_DEPTH)

    # Cut006: cut Cylinder013
    add(cylinder013.part, mode=Mode.SUBTRACT)

    # Cut007: cut Cube001
    add(cube001.part, mode=Mode.SUBTRACT)

    # Fusion: union Cut005
    add(cut005.part)


with BuildPart() as small_ring_track_with_usb_cut_1:
    # Fusion placement: moved
    add(small_ring_track_with_usb_cut.part.moved(Location((0, 0, 5))))

    # Cut014: cut Cube011
    add(cube011.part, mode=Mode.SUBTRACT)


solid = Compound([astronaut.part, standoff_base_1.part, backplate_base.part, cylinder004.part, cylinder005.part, large_led_ring.part, d1_stand_with_backing_1.part, cylinder018.part, cut013.part, small_ring_track_with_usb_cut_1.part])
